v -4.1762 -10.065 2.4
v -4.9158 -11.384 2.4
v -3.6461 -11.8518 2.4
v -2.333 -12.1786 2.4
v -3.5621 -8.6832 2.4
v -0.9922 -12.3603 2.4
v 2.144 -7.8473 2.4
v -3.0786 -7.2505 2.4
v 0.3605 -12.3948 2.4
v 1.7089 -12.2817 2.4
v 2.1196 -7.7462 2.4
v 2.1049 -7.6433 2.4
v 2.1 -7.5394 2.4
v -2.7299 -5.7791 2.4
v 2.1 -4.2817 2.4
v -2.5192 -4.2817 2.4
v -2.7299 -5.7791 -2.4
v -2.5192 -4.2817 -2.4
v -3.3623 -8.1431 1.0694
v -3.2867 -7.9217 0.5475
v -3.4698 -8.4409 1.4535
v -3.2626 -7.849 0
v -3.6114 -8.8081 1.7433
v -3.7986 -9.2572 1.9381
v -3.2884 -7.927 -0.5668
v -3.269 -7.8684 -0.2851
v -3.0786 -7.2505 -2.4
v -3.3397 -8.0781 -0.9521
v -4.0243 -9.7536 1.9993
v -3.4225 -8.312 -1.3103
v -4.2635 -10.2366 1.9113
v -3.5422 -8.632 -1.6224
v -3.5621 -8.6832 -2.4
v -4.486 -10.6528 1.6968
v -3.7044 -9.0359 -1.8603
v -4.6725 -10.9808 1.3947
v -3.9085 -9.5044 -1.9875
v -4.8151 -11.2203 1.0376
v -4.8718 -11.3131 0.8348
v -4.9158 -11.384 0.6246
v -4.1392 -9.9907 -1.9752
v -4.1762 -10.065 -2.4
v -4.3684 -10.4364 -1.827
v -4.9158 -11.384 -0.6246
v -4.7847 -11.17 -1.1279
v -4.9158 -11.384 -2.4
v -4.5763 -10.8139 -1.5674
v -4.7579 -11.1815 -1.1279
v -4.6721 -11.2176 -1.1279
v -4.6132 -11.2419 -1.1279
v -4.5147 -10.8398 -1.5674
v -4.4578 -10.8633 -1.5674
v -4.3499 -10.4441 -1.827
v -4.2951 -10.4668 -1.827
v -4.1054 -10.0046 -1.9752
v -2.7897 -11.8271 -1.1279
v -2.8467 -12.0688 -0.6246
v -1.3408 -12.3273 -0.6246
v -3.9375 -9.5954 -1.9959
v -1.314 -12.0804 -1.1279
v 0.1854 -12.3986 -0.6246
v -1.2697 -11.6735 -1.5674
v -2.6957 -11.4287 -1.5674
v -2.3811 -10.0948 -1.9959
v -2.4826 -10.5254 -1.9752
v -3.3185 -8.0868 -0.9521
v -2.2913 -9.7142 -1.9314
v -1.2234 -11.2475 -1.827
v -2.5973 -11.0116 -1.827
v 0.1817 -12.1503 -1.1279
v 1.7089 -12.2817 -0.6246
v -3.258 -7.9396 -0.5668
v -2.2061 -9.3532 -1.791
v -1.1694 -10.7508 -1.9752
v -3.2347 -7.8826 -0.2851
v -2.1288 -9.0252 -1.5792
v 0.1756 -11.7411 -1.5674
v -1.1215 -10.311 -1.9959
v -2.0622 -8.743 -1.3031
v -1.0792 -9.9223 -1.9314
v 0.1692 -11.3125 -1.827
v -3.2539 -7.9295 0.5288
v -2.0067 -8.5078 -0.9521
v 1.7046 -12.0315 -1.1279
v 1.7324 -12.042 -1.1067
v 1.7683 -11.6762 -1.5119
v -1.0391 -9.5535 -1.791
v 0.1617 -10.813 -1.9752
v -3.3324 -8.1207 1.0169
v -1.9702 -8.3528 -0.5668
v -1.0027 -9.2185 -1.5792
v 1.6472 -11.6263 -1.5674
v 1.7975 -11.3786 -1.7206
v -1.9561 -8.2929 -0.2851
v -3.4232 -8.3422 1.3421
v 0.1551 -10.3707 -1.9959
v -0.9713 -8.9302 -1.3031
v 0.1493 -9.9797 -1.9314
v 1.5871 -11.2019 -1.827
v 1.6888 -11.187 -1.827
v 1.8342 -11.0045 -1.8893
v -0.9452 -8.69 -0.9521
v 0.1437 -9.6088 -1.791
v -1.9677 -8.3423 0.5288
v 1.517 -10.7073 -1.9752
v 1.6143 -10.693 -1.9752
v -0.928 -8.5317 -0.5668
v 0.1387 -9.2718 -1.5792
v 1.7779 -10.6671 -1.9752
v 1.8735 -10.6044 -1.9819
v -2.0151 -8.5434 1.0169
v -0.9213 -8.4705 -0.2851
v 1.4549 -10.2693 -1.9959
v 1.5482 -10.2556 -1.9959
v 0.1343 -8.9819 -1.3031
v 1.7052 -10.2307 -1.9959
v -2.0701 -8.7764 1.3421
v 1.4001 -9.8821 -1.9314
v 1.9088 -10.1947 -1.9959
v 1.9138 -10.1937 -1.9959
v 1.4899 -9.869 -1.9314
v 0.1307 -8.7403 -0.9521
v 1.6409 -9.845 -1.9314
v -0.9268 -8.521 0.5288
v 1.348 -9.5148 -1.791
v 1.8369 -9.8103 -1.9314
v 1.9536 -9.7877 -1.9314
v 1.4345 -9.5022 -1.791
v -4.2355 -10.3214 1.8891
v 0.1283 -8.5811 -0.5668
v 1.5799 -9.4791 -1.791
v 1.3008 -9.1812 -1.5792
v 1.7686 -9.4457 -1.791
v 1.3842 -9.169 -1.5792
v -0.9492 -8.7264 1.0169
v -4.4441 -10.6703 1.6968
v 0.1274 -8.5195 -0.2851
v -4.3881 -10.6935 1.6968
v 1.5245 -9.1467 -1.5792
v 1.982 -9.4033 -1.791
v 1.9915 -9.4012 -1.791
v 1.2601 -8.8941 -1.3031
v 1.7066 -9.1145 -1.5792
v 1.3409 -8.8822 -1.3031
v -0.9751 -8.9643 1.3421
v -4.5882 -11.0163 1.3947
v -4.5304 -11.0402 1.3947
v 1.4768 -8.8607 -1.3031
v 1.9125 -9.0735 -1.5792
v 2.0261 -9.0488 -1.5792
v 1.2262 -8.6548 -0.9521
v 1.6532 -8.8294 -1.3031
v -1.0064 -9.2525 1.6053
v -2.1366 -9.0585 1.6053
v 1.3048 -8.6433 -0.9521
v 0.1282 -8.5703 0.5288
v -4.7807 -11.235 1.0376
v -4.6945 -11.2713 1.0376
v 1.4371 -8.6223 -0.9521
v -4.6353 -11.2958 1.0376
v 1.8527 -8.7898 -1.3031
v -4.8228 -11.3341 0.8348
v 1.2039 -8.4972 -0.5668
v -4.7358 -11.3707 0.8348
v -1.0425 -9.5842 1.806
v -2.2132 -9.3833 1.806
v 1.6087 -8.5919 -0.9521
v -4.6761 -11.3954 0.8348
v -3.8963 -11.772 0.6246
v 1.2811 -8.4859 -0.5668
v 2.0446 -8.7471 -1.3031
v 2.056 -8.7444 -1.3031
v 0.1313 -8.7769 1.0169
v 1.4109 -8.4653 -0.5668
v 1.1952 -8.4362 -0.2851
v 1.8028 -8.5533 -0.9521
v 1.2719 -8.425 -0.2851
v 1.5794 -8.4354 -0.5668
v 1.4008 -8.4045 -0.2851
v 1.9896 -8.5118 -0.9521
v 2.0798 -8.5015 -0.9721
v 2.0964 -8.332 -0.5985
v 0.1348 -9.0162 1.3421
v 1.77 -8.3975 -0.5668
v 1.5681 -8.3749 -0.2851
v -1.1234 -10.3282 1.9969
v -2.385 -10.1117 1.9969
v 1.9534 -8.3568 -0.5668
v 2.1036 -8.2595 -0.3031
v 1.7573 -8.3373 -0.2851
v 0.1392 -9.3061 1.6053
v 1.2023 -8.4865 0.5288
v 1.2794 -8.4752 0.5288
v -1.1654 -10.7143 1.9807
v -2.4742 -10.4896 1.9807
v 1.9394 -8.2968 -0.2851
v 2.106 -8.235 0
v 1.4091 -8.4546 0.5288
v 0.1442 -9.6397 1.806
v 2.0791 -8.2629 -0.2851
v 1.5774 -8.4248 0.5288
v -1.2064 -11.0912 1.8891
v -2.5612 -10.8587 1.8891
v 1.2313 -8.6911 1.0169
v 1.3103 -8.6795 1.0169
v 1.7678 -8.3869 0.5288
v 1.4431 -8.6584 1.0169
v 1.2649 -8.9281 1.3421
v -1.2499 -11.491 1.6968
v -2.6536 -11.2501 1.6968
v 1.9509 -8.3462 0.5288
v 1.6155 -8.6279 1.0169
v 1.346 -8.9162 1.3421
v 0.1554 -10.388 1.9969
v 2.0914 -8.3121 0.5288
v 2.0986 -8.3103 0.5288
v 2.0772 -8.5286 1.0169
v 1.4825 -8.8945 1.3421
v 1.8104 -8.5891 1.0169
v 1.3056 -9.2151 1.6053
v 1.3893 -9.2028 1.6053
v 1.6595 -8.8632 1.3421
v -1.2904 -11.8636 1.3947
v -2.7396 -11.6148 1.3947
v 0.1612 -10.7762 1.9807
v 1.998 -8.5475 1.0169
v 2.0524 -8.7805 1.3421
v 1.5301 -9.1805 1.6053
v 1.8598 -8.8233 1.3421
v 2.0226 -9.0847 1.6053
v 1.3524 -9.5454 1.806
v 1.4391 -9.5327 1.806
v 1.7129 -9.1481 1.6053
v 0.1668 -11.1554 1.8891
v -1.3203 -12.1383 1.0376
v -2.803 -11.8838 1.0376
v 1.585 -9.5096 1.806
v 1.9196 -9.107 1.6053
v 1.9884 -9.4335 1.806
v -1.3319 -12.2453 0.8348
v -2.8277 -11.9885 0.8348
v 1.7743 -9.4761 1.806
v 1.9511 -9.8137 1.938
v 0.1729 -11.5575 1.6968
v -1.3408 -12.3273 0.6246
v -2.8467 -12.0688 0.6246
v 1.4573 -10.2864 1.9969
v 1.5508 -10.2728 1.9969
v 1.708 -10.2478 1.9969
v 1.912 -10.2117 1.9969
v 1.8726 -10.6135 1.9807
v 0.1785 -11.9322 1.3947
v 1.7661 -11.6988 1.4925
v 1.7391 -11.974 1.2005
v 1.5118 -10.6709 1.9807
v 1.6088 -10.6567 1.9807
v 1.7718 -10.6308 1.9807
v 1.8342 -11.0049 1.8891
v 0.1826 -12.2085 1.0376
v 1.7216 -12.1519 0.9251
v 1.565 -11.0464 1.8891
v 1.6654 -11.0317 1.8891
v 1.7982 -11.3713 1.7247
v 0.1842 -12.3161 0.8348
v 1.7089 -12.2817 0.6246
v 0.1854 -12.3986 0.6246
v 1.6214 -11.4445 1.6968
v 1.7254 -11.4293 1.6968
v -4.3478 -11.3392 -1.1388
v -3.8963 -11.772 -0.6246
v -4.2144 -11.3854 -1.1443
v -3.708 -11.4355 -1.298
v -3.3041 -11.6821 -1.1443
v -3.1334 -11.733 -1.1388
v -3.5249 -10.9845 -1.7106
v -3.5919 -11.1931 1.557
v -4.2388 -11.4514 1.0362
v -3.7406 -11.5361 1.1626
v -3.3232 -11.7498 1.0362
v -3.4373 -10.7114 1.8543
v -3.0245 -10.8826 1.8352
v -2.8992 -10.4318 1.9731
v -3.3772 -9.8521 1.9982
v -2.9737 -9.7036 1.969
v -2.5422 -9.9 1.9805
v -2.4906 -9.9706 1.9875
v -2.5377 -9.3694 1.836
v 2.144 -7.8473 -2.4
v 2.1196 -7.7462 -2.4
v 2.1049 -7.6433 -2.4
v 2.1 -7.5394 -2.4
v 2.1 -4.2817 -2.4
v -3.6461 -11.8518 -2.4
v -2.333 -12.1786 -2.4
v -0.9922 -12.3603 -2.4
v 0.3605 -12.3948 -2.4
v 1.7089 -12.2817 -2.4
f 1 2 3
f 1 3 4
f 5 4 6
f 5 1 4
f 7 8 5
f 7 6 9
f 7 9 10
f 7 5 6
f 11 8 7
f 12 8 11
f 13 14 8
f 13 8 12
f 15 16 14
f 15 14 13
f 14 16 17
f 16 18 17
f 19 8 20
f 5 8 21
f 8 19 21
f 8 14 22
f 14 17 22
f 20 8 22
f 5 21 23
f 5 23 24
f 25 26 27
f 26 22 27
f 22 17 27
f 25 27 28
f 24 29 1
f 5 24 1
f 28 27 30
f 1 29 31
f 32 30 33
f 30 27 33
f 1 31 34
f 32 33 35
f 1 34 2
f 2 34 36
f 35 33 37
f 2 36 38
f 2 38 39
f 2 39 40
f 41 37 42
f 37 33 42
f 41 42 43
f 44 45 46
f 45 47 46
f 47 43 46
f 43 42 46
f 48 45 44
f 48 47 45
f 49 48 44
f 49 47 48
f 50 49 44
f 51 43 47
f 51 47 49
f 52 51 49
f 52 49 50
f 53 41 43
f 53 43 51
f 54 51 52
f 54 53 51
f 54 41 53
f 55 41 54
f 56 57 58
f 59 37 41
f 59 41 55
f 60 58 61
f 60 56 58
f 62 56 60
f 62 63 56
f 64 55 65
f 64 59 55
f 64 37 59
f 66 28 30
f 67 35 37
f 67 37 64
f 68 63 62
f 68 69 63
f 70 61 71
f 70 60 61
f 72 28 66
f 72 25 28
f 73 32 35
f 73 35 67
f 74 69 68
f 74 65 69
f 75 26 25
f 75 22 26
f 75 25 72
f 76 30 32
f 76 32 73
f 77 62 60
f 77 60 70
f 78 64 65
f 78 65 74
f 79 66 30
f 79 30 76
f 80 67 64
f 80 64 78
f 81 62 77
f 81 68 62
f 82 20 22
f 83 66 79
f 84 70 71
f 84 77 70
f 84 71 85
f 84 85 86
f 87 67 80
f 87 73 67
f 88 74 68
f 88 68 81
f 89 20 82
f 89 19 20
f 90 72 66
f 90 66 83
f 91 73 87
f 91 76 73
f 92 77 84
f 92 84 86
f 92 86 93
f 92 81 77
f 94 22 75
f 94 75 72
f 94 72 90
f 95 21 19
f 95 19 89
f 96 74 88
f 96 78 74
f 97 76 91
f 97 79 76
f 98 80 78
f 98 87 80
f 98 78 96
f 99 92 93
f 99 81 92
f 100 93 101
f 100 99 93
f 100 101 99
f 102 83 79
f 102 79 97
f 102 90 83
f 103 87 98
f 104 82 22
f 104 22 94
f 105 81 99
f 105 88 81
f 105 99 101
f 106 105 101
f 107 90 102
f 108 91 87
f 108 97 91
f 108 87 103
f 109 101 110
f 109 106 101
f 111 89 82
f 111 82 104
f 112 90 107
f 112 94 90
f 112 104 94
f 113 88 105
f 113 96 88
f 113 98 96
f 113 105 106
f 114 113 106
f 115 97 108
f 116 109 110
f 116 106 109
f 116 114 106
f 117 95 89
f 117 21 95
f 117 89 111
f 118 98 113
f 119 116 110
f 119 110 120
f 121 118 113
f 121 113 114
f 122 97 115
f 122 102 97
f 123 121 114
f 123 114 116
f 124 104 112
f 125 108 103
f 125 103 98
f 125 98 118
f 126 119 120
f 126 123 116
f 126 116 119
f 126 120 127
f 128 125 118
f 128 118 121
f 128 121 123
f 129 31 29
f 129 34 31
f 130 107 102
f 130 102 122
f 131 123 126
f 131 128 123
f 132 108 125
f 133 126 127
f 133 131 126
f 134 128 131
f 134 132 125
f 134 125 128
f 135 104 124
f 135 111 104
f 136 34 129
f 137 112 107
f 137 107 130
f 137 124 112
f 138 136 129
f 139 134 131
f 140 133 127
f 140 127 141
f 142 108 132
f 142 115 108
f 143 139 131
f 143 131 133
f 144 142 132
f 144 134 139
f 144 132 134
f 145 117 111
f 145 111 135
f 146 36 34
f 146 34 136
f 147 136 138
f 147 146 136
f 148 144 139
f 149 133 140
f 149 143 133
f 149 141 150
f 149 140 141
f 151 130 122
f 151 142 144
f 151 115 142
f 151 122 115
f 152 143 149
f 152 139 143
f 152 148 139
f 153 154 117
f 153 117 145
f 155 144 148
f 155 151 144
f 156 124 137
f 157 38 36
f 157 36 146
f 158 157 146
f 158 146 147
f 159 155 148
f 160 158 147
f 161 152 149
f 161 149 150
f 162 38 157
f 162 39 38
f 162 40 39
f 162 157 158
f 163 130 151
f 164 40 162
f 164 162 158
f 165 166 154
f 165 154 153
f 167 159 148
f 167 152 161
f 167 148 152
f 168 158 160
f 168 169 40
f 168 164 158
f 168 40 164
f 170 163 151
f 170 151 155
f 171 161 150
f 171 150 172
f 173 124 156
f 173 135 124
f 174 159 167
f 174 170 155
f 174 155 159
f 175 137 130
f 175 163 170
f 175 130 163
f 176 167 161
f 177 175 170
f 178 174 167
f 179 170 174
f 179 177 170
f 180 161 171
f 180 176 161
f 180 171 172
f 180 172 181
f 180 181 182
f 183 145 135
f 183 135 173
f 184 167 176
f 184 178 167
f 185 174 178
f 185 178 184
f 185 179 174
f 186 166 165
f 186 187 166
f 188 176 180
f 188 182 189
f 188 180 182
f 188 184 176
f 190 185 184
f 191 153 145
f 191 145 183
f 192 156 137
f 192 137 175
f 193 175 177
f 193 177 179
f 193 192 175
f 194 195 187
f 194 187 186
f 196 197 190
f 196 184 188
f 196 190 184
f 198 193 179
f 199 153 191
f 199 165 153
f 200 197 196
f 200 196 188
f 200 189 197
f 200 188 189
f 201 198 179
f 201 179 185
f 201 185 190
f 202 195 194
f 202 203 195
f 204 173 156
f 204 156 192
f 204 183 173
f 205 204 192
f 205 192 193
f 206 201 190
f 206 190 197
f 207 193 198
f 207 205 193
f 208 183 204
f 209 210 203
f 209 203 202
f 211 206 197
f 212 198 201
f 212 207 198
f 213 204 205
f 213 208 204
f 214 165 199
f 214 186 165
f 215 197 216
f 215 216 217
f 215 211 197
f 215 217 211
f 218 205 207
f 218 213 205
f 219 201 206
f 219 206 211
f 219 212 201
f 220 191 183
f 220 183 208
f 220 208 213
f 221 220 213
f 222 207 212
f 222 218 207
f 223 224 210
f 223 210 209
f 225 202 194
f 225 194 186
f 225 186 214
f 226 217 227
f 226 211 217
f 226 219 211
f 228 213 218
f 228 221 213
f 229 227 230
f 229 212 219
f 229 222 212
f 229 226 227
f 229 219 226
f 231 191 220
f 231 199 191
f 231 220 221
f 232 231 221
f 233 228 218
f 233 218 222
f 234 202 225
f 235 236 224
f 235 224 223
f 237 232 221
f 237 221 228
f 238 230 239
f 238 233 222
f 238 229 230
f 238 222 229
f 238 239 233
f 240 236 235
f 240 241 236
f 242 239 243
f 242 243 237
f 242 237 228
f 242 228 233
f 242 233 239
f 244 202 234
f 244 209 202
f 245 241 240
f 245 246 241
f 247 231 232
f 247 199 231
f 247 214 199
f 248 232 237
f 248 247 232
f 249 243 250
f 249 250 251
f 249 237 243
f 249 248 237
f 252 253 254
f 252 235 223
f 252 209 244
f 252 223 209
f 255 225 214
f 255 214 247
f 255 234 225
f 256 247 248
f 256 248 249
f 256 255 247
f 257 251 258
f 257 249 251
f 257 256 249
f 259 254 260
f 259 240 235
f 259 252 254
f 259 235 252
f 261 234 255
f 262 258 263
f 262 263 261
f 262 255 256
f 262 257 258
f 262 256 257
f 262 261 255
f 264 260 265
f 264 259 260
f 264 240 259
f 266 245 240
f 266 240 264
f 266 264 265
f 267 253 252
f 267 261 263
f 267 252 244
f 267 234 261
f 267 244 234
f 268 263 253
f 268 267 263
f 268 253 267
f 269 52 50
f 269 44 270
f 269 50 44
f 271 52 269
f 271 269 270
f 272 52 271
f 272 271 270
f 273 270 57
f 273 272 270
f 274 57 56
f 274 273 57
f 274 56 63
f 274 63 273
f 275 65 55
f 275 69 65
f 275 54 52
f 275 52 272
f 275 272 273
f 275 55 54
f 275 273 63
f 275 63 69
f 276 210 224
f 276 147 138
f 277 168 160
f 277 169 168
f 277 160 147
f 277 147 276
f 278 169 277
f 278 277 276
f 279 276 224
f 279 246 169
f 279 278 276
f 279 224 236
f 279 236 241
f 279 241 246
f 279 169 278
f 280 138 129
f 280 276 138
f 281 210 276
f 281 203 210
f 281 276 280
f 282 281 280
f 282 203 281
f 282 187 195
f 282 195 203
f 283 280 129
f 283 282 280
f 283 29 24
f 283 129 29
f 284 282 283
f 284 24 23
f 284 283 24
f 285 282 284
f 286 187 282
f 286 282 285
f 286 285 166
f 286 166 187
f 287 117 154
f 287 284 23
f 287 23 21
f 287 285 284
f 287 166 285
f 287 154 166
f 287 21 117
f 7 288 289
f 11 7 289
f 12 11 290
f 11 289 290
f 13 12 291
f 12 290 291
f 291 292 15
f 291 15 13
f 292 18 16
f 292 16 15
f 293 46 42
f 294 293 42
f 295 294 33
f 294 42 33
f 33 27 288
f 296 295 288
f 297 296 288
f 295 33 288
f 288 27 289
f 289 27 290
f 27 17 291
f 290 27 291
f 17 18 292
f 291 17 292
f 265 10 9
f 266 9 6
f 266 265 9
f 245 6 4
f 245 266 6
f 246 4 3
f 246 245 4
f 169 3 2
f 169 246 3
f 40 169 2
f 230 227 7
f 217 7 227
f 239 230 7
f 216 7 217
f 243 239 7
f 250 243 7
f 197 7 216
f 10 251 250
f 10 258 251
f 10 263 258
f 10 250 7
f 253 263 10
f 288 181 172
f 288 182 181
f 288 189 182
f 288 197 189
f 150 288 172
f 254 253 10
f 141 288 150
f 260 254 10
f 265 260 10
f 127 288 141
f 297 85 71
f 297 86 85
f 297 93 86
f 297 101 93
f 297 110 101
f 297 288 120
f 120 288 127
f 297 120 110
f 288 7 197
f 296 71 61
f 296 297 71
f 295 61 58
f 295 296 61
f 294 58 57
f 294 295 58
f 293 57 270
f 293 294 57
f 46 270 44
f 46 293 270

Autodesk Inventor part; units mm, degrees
ref_plane "YZ Plane" through (0, 0, 0) normal (1, 0, 0) x (0, 1, 0)
ref_plane "XZ Plane" through (0, 0, 0) normal (0, 1, 0) x (-1, 0, 0)
sketch "Block1" plane through (0, 0, 0) normal (0, 0, 1) x (1, 0, 0)
  arc A0 (19.4993, -13.8282) -> (19.4817, -14.1291) centre (20.4774, -14.0361) ccw construction
  line L0 (19.4993, -13.8282) -> (20.7824, -7.7917) construction
  arc A1 (21.6494, -6.5302) -> (20.7824, -7.7917) centre (22.7387, -8.2075) ccw construction
  line L1 (21.6494, -6.5302) -> (21.8911, -6.3732) construction
  arc A2 (21.8911, -6.3732) -> (16.2026, -4.7141) centre (18.9149, -5.9962) ccw construction
  arc A3 (16.1932, -4.631) -> (16.2026, -4.7141) centre (16.693, -4.6165) ccw construction
  arc A4 (16.2, -5.1) -> (16.1932, -4.631) centre (0, -5.1) ccw construction
  arc A5 (11.587, -16.123) -> (16.2, -5.1) centre (0, -4.7972) ccw construction
  arc A6 (11.587, -16.123) -> (18.1044, -18.4699) centre (18.9149, -5.9962) ccw construction
  line L2 (19.4817, -14.1291) -> (18.1044, -18.4699) construction
  circle A7 centre (18.9149, -5.9962) radius 1 construction
  arc A8 (21.7954, -6.3313) -> (16.3027, -4.7365) centre (18.9149, -5.9962) ccw
  arc A9 (21.7954, -6.3313) -> (20.6845, -7.7709) centre (22.7387, -8.2075) ccw
  line L3 (20.6845, -7.7709) -> (19.4014, -13.8074)
  arc A10 (19.4014, -13.8074) -> (19.3804, -14.1177) centre (20.4774, -14.0361) ccw
  line L4 (19.3804, -14.1177) -> (18.0329, -18.3647)
  arc A11 (11.7396, -16.1093) -> (18.0329, -18.3647) centre (18.9149, -5.9962) ccw
  arc A12 (11.7396, -16.1093) -> (16.3027, -4.7365) centre (0, -4.7972) ccw
  line L5 (15.5605, -9.6605) -> (20.0788, -10.6209)
  point P0 (17.4447, -9.0721)
  dimension "d0" = 0.1
  dimension "d1" = 8
sketch "Sketch1" plane through (0, 0, 0) normal (0, 0, 1) x (1, 0, 0)
  circle A0 centre (0, 0) radius 10.5 construction
  line L0 (-5.5192, -8.9325) -> (1.2791, -13.1329) construction
  arc A1 (2.2, -7.5394) -> (2.2454, -7.8373) centre (3.2, -7.5394) ccw construction
  line L1 (2.2, -7.5394) -> (2.2, -1.368) construction
  arc A2 (2.7858, 0.0462) -> (2.2, -1.368) centre (4.2, -1.368) ccw construction
  line L2 (2.7858, 0.0462) -> (2.9896, 0.25) construction
  arc A3 (2.9896, 0.25) -> (-2.9195, 0.6901) centre (0, 0) ccw construction
  arc A4 (-2.946, 0.7695) -> (-2.9195, 0.6901) centre (-2.4602, 0.8876) ccw construction
  arc A5 (-2.8419, 0.3121) -> (-2.946, 0.7695) centre (-18.6879, -3.0561) ccw construction
  arc A6 (-5.0623, -11.4291) -> (-2.8419, 0.3121) centre (-18.7508, -2.7598) ccw construction
  arc A7 (-5.0623, -11.4291) -> (1.8007, -12.3696) centre (0, 0) ccw construction
  line L3 (2.2454, -7.8373) -> (1.8007, -12.3696) construction
  circle A8 centre (0, 0) radius 1 construction
  arc A9 (2.8873, 0.2711) -> (-2.817, 0.689) centre (0, 0) ccw
  arc A10 (2.8873, 0.2711) -> (2.1, -1.368) centre (4.2, -1.368) ccw
  line L4 (2.1, -1.368) -> (2.1, -7.5394)
  arc A11 (2.1, -7.5394) -> (2.144, -7.8473) centre (3.2, -7.5394) ccw
  line L5 (2.144, -7.8473) -> (1.7089, -12.2817)
  arc A12 (-4.9158, -11.384) -> (1.7089, -12.2817) centre (0, 0) ccw
  arc A13 (-4.9158, -11.384) -> (-2.817, 0.689) centre (-18.7508, -2.7598) ccw
  line L6 (-2.5192, -4.2817) -> (2.1, -4.2817)
  dimension "d4" = 21
  dimension "d5" = 3
extrude "Extrusion1" add sketch "Sketch1" along normal mid plane 4.8 contours L6 L4 A11 L5 A12 A13
ref_plane "Work Plane1" through (-5.5192, -8.9325, 0) normal (0.85071, -0.5256353, 0) x (0.5256353, 0.85071, 0)
sketch "Sketch2" plane through (-5.5192, -8.9325, 0) normal (0.85071, -0.5256353, 0) x (0.5256353, 0.85071, 0)
  circle A0 centre (0, 0) radius 2
  line L0 (10.5, -2.8) -> (10.5, 2.8) projected
  point P0 (10.5, 0)
  dimension "d6" = 4
revolve "Revolution1" cut sketch "Sketch2" angle 360 about axis through (0, 0, 0) along (0, 0, 1)
properties part number "ORingToolA"
